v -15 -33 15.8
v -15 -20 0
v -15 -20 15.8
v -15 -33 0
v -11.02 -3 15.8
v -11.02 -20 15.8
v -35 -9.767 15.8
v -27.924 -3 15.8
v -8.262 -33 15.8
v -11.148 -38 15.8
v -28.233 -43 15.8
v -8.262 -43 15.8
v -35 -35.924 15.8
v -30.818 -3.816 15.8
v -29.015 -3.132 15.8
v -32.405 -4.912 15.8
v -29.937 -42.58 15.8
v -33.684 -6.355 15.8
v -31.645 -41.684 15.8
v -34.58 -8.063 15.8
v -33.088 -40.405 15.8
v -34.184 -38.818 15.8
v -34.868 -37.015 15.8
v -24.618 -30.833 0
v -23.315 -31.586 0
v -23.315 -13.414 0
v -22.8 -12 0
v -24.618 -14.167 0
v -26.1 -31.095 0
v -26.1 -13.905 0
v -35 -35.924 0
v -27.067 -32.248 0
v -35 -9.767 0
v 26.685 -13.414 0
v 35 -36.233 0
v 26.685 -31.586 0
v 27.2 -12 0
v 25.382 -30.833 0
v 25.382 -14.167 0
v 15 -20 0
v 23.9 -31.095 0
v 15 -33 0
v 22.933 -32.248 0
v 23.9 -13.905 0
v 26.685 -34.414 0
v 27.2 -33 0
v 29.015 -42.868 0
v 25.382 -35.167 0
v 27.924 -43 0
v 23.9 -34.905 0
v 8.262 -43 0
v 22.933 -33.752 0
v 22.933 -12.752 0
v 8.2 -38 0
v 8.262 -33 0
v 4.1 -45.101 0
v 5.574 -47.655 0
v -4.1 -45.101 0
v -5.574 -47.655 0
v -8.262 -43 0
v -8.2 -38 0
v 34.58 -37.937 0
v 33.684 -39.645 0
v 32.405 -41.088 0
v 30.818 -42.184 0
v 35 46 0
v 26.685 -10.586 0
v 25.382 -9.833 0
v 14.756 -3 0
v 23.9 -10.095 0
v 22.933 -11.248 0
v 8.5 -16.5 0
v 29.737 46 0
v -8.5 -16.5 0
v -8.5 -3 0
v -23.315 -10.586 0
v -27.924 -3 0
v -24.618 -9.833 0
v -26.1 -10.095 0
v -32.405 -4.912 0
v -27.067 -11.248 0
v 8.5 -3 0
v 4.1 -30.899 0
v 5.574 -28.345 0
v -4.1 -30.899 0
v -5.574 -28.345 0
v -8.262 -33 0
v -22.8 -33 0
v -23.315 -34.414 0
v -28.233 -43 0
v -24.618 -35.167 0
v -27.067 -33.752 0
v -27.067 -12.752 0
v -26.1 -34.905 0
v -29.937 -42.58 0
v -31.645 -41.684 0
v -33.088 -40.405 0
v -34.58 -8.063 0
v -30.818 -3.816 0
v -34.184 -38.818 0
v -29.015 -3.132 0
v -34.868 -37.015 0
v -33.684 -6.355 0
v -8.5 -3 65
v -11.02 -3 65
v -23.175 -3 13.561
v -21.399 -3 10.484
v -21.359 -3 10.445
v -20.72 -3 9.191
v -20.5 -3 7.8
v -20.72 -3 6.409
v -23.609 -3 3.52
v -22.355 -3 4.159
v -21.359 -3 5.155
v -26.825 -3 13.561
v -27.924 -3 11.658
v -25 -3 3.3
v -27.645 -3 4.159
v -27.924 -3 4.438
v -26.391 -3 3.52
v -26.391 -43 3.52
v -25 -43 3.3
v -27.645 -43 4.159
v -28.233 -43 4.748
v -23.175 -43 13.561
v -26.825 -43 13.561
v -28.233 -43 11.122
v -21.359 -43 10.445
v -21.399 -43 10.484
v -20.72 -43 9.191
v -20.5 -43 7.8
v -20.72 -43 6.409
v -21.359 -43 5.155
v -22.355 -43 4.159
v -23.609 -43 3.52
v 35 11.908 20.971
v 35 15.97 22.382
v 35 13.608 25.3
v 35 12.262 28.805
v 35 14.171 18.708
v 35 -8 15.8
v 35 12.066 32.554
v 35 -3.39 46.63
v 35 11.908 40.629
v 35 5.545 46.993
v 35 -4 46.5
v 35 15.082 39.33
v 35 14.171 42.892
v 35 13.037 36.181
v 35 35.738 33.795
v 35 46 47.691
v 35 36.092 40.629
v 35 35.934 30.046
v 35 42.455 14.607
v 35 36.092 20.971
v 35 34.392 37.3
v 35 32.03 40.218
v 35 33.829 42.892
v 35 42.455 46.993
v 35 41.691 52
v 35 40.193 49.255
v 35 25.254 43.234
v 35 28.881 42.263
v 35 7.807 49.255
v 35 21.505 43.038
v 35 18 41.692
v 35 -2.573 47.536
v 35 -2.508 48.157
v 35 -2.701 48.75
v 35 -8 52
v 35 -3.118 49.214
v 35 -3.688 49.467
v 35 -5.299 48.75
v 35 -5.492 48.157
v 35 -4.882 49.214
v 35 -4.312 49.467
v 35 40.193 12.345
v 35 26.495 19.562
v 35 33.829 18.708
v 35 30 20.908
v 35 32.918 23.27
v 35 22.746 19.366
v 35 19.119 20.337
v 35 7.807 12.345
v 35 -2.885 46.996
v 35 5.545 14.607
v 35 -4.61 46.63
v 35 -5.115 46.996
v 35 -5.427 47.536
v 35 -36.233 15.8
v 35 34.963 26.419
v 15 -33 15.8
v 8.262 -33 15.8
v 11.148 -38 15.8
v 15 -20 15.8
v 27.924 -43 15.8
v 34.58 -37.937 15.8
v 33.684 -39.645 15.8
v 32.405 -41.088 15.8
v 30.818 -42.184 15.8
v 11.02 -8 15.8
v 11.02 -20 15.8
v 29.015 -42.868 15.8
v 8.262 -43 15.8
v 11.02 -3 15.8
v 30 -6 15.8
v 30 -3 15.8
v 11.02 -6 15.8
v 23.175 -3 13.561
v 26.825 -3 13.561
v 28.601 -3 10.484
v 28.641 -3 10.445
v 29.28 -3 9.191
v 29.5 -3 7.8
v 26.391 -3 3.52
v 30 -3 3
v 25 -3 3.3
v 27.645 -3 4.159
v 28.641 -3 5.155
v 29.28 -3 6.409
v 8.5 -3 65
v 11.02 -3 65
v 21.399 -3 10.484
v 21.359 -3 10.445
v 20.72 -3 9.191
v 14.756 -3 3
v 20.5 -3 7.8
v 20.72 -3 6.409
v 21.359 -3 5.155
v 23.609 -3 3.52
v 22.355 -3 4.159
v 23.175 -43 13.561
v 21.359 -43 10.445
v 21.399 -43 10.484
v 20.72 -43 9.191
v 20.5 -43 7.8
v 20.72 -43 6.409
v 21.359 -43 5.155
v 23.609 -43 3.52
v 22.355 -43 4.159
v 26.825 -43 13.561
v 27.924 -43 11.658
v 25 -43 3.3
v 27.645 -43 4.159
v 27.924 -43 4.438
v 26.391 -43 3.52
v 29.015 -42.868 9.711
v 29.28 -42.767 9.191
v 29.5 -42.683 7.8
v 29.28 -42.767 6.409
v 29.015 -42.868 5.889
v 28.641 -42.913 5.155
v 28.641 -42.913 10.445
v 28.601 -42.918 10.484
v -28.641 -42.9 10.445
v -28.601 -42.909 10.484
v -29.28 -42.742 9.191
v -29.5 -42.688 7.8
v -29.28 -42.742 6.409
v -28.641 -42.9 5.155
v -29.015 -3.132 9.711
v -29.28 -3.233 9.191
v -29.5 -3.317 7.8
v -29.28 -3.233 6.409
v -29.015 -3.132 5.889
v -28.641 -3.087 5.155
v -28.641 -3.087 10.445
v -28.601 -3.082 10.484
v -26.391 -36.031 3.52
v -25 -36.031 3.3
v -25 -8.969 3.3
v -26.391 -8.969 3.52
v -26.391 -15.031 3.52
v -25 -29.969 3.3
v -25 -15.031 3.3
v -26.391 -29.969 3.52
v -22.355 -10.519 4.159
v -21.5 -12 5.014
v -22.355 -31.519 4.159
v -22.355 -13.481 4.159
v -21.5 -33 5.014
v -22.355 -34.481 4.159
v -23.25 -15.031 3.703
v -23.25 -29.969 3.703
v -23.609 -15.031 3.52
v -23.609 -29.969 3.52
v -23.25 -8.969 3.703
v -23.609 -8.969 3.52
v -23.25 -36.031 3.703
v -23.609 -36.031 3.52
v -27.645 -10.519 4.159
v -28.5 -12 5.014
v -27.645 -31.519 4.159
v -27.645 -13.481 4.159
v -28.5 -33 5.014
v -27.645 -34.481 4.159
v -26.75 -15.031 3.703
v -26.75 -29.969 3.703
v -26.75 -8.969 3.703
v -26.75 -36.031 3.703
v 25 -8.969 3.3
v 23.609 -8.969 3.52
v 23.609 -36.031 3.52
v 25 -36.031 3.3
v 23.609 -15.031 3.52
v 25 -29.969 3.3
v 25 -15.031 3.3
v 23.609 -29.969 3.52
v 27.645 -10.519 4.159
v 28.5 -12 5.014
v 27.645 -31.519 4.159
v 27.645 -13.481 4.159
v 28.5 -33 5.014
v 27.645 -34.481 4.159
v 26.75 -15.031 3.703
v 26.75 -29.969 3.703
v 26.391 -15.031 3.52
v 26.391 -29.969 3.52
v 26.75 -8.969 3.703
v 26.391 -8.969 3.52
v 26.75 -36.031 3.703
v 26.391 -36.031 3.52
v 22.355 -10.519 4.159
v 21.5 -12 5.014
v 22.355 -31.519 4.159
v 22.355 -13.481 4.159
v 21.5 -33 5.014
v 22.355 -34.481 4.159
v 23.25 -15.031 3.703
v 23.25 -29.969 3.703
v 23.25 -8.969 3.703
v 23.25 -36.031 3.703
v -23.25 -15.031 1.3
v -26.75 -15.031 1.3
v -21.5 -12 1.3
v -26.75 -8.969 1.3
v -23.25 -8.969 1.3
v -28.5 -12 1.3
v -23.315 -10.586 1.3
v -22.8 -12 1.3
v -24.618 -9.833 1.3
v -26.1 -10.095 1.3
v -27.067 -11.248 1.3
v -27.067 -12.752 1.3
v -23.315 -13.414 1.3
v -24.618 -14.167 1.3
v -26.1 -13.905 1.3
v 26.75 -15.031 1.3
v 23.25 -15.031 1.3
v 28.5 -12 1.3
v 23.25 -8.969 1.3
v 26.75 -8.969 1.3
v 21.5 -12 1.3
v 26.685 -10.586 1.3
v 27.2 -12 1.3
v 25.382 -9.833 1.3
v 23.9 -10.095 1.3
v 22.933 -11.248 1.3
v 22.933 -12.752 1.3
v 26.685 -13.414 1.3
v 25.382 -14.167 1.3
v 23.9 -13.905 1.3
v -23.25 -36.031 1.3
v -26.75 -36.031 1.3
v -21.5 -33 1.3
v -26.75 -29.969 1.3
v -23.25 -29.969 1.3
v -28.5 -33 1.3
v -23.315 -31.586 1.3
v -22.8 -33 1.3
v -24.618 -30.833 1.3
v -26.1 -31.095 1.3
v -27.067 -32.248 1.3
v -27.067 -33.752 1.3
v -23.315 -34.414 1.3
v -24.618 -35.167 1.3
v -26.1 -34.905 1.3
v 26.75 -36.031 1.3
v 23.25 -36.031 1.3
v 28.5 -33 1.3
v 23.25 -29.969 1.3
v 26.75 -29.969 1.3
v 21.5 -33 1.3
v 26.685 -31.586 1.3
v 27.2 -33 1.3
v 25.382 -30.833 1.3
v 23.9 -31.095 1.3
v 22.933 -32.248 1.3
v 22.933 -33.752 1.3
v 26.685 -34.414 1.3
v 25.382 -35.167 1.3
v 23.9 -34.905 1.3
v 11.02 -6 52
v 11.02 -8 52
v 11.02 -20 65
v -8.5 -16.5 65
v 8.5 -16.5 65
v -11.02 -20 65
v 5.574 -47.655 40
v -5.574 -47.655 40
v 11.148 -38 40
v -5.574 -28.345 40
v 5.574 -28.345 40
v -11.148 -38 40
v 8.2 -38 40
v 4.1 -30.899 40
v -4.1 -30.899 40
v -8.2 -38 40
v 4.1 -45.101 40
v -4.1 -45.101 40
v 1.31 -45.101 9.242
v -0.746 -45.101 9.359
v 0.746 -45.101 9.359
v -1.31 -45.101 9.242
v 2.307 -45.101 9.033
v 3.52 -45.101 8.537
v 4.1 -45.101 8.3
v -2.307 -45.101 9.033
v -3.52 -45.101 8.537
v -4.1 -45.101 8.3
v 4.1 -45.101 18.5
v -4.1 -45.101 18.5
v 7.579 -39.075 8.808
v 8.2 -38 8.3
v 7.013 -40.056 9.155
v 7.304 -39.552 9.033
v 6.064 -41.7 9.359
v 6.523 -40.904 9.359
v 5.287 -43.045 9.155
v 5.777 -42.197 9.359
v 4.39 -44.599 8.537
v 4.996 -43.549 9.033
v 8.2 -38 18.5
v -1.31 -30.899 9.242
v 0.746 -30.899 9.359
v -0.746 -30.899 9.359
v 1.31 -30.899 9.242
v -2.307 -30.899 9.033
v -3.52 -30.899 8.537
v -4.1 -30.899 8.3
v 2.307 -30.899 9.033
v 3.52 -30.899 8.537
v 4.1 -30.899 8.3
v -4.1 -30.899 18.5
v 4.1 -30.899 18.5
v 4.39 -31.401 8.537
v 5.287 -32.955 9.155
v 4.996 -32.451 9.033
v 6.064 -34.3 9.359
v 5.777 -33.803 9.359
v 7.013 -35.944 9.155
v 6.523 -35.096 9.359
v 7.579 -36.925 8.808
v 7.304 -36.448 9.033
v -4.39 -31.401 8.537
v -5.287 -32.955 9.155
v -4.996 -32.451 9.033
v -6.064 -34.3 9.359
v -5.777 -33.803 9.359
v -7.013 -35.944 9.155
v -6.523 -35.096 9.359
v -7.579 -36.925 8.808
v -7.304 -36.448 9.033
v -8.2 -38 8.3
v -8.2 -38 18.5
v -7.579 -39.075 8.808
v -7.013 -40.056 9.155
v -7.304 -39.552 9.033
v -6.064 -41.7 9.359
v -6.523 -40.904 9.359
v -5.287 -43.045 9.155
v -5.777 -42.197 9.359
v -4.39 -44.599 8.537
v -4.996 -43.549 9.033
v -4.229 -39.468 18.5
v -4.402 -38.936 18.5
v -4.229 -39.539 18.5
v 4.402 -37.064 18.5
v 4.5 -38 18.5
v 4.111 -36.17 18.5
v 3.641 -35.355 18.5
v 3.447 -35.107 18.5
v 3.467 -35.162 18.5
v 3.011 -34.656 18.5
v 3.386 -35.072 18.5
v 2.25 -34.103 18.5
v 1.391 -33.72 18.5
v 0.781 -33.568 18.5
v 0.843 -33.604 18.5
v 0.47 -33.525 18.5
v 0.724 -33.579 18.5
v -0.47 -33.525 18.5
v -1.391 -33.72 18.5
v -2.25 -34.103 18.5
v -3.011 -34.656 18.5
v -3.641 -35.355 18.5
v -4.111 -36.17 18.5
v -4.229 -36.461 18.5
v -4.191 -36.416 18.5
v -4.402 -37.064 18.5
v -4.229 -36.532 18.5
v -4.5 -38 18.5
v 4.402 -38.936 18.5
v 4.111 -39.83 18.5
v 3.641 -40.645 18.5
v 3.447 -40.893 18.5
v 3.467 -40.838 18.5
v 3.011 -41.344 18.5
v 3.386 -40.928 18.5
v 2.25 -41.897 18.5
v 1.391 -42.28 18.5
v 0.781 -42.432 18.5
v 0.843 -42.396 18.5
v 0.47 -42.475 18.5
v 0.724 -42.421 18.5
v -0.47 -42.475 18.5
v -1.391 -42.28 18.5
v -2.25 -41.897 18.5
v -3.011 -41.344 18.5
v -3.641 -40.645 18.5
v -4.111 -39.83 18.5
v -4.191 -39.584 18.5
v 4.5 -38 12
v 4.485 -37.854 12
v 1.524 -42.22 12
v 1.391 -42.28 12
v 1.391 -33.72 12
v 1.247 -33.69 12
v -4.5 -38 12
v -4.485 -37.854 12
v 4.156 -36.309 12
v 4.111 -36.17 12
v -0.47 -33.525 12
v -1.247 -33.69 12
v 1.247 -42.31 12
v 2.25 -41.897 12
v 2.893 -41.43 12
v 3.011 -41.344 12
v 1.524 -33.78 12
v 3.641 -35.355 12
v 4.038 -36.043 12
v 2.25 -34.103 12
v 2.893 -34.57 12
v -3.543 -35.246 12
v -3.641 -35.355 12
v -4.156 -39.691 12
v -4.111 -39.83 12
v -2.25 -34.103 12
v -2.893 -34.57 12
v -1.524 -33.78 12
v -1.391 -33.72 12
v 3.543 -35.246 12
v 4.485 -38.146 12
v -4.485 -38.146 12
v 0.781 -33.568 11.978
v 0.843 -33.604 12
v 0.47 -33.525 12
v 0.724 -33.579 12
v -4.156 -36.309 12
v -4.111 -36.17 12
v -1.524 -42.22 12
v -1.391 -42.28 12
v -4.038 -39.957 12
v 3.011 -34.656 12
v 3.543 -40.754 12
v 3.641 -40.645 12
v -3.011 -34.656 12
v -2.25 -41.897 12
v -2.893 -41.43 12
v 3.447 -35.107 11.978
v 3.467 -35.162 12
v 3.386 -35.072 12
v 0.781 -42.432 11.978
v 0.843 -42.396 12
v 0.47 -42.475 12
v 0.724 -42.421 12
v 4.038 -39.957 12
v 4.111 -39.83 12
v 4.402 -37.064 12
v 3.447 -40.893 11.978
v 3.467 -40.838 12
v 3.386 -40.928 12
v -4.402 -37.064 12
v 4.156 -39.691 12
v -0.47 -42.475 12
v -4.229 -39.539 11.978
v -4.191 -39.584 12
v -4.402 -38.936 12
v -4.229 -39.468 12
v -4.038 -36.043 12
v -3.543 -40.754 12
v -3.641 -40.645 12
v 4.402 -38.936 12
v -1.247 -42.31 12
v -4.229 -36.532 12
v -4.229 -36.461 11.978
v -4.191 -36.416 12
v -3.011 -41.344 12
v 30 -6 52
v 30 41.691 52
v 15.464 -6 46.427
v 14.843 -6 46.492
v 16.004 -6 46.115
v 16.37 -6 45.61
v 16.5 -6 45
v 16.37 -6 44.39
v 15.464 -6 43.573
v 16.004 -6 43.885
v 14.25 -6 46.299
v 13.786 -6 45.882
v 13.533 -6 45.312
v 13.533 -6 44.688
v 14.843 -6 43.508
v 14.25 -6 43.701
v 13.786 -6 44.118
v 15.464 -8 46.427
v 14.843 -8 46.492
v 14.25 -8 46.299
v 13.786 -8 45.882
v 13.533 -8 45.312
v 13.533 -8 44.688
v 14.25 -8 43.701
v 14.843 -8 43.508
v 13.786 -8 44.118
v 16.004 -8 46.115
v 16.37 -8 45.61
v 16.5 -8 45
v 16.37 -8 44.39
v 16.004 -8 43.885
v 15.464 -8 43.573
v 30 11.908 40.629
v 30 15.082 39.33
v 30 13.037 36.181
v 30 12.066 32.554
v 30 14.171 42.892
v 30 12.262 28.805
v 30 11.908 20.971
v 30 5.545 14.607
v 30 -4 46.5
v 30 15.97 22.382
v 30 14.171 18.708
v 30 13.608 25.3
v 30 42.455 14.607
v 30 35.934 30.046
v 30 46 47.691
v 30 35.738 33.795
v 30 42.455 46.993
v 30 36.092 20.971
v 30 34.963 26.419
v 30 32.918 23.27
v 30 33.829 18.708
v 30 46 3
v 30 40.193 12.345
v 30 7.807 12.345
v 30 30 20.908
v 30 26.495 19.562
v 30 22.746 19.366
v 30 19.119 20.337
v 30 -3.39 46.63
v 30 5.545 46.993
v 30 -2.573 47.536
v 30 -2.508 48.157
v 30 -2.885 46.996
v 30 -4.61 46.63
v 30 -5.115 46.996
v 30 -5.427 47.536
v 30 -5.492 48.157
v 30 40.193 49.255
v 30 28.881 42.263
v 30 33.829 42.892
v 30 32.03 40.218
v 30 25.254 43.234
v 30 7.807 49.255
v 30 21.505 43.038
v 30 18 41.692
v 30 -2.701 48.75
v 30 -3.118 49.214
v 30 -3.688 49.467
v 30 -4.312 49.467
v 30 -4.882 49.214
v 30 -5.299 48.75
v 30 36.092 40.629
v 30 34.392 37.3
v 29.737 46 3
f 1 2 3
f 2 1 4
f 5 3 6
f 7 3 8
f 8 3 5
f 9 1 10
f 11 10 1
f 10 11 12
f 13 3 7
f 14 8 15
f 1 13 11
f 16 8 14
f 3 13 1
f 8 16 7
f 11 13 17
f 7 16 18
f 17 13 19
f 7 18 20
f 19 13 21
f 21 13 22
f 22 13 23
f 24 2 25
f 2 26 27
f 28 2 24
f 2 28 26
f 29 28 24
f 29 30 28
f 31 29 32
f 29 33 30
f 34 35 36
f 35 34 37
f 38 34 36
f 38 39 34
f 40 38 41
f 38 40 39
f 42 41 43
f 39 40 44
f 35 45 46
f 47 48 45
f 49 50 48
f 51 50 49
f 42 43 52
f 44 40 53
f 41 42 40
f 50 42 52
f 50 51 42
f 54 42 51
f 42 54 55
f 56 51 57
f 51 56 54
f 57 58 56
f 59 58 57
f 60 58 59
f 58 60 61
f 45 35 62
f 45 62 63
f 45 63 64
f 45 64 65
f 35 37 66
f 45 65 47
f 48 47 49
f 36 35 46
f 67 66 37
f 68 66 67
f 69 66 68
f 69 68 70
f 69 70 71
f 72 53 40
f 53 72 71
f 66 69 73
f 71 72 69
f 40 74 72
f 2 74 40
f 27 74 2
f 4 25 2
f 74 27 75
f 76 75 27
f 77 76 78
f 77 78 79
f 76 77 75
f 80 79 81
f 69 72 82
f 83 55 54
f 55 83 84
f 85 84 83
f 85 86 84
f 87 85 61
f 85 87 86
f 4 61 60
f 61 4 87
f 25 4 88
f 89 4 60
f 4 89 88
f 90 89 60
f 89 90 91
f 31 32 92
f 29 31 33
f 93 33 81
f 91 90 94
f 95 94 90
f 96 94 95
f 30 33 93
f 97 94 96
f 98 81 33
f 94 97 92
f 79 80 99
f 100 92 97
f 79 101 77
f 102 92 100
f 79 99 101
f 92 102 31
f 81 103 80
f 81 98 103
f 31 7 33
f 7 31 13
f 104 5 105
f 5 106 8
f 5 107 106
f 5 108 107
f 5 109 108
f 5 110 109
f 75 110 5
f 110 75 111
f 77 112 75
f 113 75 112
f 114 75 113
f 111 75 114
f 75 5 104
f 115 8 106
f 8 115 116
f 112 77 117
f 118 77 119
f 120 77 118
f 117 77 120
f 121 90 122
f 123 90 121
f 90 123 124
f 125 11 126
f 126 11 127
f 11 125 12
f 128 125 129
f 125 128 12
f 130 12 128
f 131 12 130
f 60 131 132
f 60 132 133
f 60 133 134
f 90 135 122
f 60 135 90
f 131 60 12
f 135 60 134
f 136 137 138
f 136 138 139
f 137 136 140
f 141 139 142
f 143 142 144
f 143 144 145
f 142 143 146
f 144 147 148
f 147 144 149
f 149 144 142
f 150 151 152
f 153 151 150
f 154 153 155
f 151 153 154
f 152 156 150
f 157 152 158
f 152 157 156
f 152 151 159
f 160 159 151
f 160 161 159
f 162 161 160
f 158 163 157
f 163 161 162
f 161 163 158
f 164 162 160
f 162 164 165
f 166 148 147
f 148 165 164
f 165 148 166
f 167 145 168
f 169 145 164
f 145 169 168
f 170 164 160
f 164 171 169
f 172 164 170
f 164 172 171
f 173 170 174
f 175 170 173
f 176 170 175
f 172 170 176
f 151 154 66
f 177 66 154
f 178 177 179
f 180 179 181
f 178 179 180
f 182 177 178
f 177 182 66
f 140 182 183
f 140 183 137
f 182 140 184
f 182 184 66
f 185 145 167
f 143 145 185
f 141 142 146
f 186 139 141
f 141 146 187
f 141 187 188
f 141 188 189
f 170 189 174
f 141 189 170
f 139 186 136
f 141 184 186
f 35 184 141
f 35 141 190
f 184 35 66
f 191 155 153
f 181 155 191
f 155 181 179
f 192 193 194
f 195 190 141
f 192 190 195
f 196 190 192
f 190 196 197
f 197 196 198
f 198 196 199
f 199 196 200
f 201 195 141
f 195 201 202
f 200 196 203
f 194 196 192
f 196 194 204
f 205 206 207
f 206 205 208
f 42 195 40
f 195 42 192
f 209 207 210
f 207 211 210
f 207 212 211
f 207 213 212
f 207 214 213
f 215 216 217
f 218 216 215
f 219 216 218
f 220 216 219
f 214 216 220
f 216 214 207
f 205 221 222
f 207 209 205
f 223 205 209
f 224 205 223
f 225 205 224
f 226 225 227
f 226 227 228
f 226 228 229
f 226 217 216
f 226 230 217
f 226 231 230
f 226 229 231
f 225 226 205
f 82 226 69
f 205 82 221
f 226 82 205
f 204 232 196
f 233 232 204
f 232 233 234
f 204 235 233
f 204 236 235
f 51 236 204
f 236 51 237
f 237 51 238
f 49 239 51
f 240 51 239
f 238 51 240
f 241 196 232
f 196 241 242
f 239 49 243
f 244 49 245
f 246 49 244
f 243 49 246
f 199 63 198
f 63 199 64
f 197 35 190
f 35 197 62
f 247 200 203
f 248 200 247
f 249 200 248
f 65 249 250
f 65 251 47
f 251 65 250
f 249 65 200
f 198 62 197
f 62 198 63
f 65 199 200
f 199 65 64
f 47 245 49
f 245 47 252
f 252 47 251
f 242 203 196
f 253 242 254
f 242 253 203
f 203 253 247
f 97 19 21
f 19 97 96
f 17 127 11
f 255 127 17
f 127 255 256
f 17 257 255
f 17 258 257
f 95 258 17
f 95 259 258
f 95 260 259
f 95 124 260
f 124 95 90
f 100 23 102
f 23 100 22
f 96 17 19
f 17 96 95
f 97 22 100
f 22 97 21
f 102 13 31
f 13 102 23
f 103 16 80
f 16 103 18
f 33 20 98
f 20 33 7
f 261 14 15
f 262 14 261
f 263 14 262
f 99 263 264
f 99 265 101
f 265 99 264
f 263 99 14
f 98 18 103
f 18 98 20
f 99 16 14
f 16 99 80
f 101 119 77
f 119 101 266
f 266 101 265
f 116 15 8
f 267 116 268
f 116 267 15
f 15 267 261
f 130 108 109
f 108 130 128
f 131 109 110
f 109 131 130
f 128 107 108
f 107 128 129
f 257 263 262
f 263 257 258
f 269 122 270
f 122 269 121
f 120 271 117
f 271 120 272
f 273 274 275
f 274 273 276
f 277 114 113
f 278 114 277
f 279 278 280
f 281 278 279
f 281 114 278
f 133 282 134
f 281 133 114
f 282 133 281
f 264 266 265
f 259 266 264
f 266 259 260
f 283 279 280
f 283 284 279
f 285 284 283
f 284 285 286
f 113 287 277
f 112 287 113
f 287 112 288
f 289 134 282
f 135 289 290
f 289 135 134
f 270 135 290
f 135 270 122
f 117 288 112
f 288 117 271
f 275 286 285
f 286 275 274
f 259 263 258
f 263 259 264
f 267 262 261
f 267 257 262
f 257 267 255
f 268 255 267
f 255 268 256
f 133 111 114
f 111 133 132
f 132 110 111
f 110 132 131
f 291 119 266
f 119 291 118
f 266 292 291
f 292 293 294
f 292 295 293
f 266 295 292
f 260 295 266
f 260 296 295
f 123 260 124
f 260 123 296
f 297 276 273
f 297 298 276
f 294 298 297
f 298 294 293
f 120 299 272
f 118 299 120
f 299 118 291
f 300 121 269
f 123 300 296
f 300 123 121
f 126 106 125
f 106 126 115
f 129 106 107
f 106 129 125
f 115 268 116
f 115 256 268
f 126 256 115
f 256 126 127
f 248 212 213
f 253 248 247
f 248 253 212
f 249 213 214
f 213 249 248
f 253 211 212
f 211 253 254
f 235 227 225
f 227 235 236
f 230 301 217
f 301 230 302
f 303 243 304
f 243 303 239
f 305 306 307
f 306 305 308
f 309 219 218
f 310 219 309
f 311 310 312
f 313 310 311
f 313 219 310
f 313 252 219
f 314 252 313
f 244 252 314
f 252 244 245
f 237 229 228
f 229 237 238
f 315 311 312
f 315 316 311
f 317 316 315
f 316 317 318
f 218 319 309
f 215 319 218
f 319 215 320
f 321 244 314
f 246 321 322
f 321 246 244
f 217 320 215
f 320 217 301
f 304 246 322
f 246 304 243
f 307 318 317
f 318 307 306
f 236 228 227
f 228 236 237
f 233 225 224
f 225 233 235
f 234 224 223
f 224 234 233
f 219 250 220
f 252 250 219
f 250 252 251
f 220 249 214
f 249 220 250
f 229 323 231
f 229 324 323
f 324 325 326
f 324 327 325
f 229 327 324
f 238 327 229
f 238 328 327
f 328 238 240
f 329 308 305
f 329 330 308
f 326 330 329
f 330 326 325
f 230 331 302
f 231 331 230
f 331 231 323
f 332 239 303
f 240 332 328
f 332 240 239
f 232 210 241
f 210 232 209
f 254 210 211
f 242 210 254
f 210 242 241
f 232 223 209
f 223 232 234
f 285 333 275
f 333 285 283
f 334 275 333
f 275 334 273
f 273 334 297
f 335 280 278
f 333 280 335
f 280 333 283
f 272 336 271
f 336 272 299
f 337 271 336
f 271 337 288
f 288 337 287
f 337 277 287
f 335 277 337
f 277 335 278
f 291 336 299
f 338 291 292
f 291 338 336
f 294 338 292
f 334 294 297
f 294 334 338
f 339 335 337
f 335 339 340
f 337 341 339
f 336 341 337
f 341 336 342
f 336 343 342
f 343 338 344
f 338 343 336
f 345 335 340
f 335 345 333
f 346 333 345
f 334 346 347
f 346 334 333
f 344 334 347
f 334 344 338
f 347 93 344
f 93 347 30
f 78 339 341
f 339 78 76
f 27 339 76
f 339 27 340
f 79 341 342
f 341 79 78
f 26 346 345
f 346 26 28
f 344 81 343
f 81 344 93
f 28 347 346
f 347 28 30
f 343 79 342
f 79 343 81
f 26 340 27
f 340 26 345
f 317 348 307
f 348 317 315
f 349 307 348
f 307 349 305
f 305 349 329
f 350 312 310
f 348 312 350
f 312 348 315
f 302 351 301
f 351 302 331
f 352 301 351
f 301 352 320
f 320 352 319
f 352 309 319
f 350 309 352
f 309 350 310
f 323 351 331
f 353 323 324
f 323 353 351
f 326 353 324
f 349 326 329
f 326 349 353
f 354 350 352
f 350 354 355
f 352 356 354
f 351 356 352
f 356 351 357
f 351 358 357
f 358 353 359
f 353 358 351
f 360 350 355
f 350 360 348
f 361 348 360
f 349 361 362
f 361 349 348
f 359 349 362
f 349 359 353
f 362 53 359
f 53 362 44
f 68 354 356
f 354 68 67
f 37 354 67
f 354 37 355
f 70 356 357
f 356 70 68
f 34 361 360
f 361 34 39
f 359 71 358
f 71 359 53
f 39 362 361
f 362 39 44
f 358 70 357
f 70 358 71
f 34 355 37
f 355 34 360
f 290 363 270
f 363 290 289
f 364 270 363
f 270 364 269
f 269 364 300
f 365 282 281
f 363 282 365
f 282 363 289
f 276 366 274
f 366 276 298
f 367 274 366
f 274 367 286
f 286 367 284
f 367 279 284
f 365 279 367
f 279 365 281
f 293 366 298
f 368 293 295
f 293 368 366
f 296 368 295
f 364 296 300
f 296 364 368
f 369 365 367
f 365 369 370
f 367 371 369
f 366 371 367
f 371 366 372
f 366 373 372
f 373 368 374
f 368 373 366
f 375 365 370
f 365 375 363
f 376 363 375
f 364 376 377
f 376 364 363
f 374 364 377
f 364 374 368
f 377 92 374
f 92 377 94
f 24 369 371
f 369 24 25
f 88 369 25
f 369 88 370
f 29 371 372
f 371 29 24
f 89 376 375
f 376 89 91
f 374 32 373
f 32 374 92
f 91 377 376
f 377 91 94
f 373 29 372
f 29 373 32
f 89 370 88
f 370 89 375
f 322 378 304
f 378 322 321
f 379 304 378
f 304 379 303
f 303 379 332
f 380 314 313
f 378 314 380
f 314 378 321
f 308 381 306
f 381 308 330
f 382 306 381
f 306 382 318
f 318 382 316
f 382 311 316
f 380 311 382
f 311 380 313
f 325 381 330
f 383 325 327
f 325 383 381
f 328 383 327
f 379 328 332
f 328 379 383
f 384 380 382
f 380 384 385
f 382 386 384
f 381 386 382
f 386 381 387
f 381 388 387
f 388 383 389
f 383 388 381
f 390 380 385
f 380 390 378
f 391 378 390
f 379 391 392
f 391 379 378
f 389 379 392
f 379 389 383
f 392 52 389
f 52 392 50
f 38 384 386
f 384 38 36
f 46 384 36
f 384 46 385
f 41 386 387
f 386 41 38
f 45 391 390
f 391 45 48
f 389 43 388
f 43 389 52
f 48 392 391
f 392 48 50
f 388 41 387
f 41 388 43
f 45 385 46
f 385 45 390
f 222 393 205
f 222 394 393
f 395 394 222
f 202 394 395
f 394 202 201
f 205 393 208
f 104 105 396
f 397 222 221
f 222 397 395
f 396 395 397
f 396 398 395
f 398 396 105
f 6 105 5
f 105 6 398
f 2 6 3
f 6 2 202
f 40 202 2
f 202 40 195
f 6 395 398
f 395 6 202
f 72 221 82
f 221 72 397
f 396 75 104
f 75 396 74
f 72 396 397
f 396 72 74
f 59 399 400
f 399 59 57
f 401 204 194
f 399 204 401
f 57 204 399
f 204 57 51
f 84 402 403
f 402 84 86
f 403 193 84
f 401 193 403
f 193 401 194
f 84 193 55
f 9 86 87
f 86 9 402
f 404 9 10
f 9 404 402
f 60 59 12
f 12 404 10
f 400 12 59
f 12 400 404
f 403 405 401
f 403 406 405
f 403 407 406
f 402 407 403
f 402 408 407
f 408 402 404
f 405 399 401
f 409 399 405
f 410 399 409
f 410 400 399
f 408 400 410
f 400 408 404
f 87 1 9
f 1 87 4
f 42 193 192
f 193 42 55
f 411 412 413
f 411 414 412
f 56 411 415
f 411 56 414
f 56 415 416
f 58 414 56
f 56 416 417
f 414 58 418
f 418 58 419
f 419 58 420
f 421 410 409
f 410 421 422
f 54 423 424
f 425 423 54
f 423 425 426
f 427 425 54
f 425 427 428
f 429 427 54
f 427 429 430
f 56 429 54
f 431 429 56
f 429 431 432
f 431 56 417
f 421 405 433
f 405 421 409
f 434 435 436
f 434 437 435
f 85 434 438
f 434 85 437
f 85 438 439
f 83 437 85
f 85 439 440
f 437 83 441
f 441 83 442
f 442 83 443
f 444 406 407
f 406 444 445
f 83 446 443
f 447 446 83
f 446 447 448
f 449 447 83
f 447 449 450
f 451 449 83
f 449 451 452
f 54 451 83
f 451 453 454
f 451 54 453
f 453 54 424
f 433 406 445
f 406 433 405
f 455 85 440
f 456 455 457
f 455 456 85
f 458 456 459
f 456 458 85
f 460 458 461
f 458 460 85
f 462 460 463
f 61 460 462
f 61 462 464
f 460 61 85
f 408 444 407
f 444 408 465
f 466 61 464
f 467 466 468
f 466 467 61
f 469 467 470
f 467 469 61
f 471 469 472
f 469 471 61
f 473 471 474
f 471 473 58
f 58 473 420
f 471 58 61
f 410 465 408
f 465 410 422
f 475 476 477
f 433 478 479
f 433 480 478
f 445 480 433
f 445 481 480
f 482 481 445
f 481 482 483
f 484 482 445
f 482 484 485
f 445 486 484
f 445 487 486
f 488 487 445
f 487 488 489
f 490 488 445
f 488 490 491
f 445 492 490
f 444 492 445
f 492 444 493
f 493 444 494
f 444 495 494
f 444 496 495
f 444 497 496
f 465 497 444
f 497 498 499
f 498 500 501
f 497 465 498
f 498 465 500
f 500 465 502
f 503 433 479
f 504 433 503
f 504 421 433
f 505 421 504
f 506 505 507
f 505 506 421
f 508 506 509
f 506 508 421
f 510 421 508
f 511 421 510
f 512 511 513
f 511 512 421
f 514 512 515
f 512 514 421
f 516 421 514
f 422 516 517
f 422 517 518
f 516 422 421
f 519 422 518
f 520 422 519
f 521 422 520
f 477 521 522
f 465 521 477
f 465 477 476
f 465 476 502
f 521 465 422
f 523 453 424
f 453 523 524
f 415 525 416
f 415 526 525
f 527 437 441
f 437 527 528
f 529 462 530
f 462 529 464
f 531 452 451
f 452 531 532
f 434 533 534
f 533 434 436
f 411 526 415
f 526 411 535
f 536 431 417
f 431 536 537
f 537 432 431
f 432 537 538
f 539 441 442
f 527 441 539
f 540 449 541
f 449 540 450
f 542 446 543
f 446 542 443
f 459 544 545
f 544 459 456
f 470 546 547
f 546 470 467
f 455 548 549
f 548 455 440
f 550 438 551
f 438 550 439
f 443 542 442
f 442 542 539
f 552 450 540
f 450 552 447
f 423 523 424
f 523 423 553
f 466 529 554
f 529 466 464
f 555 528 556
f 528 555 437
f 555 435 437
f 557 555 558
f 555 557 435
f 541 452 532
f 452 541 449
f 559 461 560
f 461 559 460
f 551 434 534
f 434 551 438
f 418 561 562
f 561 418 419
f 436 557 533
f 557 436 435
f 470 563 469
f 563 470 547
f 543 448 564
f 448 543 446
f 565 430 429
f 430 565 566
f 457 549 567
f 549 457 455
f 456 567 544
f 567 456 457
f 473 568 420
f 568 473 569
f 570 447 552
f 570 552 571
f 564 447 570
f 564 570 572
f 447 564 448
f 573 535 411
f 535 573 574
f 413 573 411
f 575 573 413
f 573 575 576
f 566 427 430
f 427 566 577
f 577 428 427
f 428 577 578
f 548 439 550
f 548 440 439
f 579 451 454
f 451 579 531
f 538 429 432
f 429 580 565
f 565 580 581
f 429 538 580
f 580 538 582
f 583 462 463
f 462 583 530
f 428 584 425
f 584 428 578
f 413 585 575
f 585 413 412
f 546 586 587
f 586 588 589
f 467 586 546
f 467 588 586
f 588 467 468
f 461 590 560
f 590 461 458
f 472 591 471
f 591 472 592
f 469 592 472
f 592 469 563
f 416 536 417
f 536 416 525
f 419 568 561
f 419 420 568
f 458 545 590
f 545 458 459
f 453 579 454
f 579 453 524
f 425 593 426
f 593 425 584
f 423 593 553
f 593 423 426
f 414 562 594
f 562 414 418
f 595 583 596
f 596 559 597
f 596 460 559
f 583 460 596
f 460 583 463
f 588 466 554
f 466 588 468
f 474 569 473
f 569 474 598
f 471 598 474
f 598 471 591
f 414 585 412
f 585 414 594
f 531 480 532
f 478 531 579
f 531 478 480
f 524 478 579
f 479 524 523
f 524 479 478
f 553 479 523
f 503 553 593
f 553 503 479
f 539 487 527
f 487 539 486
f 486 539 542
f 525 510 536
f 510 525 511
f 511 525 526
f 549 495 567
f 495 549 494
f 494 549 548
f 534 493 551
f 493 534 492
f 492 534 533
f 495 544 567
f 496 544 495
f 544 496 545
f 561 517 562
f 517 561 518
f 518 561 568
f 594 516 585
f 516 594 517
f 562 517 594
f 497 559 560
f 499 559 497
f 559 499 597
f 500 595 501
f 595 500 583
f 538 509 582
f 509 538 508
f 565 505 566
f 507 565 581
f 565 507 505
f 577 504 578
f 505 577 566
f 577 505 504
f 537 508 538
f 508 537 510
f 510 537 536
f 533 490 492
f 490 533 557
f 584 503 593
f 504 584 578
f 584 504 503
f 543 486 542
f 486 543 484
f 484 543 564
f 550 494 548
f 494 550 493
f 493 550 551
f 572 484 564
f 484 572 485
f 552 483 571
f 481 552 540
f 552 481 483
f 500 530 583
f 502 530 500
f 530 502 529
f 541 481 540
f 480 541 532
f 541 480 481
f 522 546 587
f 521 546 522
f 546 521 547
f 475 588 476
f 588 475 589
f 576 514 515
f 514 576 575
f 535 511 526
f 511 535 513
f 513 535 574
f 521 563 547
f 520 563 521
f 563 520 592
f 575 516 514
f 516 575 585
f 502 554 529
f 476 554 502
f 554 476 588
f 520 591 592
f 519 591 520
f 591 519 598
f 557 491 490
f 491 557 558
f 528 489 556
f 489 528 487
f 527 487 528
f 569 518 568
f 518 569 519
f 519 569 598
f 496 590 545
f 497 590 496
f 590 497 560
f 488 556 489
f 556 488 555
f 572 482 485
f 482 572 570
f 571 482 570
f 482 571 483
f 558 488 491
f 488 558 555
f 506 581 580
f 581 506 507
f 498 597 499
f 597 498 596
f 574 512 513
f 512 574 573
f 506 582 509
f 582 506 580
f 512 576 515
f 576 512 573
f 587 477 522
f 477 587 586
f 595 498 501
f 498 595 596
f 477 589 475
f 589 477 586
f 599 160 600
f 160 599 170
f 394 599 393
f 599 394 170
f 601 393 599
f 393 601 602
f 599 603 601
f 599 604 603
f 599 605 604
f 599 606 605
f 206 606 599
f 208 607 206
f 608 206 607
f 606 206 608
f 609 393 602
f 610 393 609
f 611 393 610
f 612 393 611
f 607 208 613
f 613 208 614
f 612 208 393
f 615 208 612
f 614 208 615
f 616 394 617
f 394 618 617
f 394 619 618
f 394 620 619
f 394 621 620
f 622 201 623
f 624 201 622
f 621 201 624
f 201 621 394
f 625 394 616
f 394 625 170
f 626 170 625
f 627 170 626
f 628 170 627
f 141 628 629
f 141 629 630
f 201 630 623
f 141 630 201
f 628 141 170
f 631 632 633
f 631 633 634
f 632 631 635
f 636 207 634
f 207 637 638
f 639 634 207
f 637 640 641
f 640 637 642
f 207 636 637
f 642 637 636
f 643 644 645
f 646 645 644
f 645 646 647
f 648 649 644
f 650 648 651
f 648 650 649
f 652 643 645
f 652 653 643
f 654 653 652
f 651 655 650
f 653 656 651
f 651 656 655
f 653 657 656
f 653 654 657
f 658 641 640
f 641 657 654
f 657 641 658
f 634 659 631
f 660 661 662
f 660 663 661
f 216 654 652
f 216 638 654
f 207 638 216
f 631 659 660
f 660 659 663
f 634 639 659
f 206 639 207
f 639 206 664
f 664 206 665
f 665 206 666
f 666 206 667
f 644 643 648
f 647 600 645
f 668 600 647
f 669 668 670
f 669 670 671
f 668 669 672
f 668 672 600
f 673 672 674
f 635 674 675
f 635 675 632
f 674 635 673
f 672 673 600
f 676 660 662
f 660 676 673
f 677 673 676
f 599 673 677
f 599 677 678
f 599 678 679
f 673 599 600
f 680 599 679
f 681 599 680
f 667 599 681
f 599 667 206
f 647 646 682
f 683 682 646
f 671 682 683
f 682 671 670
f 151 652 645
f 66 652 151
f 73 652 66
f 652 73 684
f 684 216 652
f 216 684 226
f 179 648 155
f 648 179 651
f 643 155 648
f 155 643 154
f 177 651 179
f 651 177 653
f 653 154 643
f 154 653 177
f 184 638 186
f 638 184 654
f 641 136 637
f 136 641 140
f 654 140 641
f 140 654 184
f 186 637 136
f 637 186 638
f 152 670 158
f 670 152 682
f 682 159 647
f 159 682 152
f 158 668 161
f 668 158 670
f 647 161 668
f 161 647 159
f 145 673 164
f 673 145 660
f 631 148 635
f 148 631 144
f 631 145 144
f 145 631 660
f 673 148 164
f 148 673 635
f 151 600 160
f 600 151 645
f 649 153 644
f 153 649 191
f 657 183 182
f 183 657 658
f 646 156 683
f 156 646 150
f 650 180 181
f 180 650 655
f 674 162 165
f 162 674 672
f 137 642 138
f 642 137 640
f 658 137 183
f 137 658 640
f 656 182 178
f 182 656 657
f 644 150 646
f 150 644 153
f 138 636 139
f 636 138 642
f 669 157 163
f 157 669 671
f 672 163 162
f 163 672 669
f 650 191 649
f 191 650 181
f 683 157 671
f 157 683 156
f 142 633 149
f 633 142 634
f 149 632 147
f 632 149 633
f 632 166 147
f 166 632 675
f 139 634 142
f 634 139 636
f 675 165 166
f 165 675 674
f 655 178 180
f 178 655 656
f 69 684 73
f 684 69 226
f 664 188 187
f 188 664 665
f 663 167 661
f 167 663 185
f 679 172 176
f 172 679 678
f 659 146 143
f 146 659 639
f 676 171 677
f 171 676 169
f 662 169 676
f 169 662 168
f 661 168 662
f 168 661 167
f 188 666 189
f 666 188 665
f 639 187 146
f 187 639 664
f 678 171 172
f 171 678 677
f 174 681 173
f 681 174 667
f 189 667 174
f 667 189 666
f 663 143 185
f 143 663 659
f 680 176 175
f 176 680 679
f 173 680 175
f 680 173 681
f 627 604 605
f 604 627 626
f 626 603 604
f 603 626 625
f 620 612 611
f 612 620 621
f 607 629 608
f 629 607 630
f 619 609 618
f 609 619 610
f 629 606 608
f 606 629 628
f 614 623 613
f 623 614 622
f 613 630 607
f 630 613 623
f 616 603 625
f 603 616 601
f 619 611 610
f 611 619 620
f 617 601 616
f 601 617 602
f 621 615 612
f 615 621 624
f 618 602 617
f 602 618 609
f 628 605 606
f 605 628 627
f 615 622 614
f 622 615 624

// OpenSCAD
// file: ../configuration.scad
// PRUSA Mendel  
// Configuration file
// GNU GPL v2
// Josef Pra
// josefprusa@me.com
// prusadjs.cz
// http://www.reprap.org/wiki/Prusa_Mendel
// http://github.com/prusajr/PrusaMendel


// PLEASE SELECT ONE OF THE CONFIGURATIONS BELOW
// BY UN-COMMENTING IT


variant=0; //0 for metric
//variant=1; //1 for SAE
if(variant==0){
echo("variant: metric");
}else if(variant==1){
echo("variant: sae");
} else{
echo("WARNING: INVALID CONFIGURATION");
}




vars=[
//[m8_dia, m8_nut, m4_dia, m4_nut, m3_dia, m3_nut, bush_dia, mot_shaft, bush_rod, bush_outerdia, bush_length]
[9,16.4,5,9,4.4,7,11,5.3,8,16,11],//metric
[9,15.7,5.5,10.6,5.5,10.6,11.5,5.3,7.9375,16,11]//SAE
];


//BUSHING TYPE Can generate three versions
// 1 - regular old ones
// 2 - helical ones
// 3 - holders for brass or any other bought bushings
bushing_type = 2;


//Round corner diameter
round_corner_diameter = 8;


//Thin wall size
layer_height = 0.4;
perimeter_width_over_thicknes = 1.6;
infill_widht_over_thickness = 1.55;
thin_wall = 2*(perimeter_width_over_thicknes*layer_height+infill_widht_over_thickness*layer_height);
if(thin_wall<2){
	echo("Check thin wall size, its below 2mm!");
}
echo(thin_wall);


//DO NOT TOUCH THIS SECTION!
m8_diameter = vars[variant][0];
m8_nut_diameter = vars[variant][1];
m4_diameter = vars[variant][2];
m4_nut_diameter = vars[variant][3];
m3_diameter = vars[variant][4];
m3_nut_diameter = vars[variant][5];
bushing_diameter = vars[variant][6];
motor_shaft=vars[variant][7];
bushing_rodsize = vars[variant][8];
bushing_outerDiameter = vars[variant][9];
bushing_lenght = vars[variant][10];




// MINI-HUXLEY VERSION (TODO, just place holder)
// include <configuration-huxley.scad>


// MEGA VERSION (TODO, just place holder)
// include <configuration-mega.scad>




// Some basic functions, probably should be somewhere else
module roundcorner(diameter){
	difference(){
		cube(size = [diameter,diameter,99], center = false);
		translate(v = [diameter, diameter, 0]) cylinder(h = 100, r=diameter, center=true);
	}
}
// main file
// PRUSA Mendel  
// X-end with NEMA 17 motor mount
// GNU GPL v2
// Josef Průša
// josefprusa@me.com
// prusadjs.cz
// http://www.reprap.org/wiki/Prusa_Mendel
// http://github.com/prusajr/PrusaMendel

// Modified by Adrian to remove bridges and to add a conical cavity for the bottom nut.  This prints more reliably and cleanly.  I
// also added small holes to allow a loop of 3mm filament to be attached by a cable tie to make a flexible wire support.
// 26 May 2011


include <../configuration.scad>
corection = 1.17; 

/**
 *@name X end motor
 *@using 2 bushing
 *@using 8 m3x10
 *@using 4 m3xnut
 *@using 4 m3xwasher
 *@using 1 m8spring
 *@using 2 m8nut
 */


module xendmotor(){
difference()
{
translate(v = [0,17,24.5]) union(){
difference(){
union(){
//translate(v = [0, -25, 0]) cube(size = [70,70,5], center = true);
translate(v = [-25, -40, -16.6])cube(size = [20,40,15.8], center = true);
translate(v = [25, -40, -16.6])cube(size = [20,40,15.8], center = true);
}


//nut traps

translate(v = [-25, -29, -19.7]) cylinder(h = 7, r=m3_nut_diameter/2, $fn=6, center=true);
translate(v = [-25, -29, -20]) cylinder(h = 10, r=m3_diameter/2, $fn=9, center=true);
translate(v = [25, -29, -19.7]) cylinder(h = 7, r=m3_nut_diameter/2, $fn=6, center=true);
translate(v = [25, -29, -20]) cylinder(h = 10, r=m3_diameter/2, $fn=9, center=true);

translate(v = [-25, -50, -19.7]) cylinder(h = 7, r=m3_nut_diameter/2, $fn=6, center=true);
translate(v = [-25, -50, -20]) cylinder(h = 10, r=m3_diameter/2, $fn=9, center=true);
translate(v = [25, -50, -19.7]) cylinder(h = 7, r=m3_nut_diameter/2, $fn=6, center=true);
translate(v = [25, -50, -20]) cylinder(h = 10, r=m3_diameter/2, $fn=9, center=true);

//round corners
translate(v = [35.1, -60.1, -25]) rotate(a=[0,0,90]) roundcorner(round_corner_diameter);
translate(v = [-35.1, -60.1, -25]) rotate(a=[0,0,0]) roundcorner(round_corner_diameter);
translate(v = [-35.1, -19.9, -25]) rotate(a=[0,0,-90]) roundcorner(round_corner_diameter);

//holes for axis
translate(v = [-25, -18-22, -16.7]) rotate(a=[90,0,0]) {
	cylinder(h = 42, r=4.5, $fn=20, center=true);
	translate(v = [0, 2.60, 0]) cylinder(h = 42, r=3.65, $fn=6, center=true);
}
translate(v = [25, -18-22, -16.7]) rotate(a=[90,0,0]) {
	cylinder(h = 42, r=4.5, $fn=20, center=true);
	translate(v = [0, 2.60, 0]) cylinder(h = 42, r=3.65, $fn=6, center=true);
}
//slider cutouts
translate(v = [0, -25, 15]) 
	difference(){
	translate(v = [0, -0, -14.5])cube(size = [23,23,50], center = true);
	}
//nut trap
translate(v = [0, -55, 15]) {
	difference(){
	translate(v = [0, -0, -15])cylinder(h = 50, r=m8_nut_diameter/2+thin_wall, $fn=6, center=true);
	}
}
}

//slider
translate(v = [0, -25, 15]) 
	difference(){
union(){
	translate(v = [0, -3.5, -7]) cube(size = [17+2*thin_wall,17,65], center = true);

	translate(v = [0, -3.5, -31.6]) cube(size = [33,17,15.8], center = true);}
	translate(v = [0, -0, -7])cube(size = [17,17,70], center = true);}

//nut trap
translate(v = [0, -55, 15]) {
difference(){
	union(){difference(){
union(){
	translate(v = [0, -0, -19.5])cylinder(h = 40, r=m8_nut_diameter/2+thin_wall*corection, $fn=6, center=true);
	translate(v = [0, 0, -31.6]) cube(size = [35,10,15.8], center = true);}
	cylinder(h = 90, r=m8_nut_diameter/2, $fn=6, center=true);
	}
	
// Generate nut barrier with conical lead in under.  Replace this...

	//translate(v = [10, 0, -31]) cylinder(h = 4, r=m8_nut_diameter/2+thin_wall, $fn=6, center=true);

// ... with this--------
	difference()
	{
	translate(v = [0, 0, -29]) cylinder(h = 16, r=m8_nut_diameter/2+thin_wall, $fn=6, center=true);
	translate(v = [0, 0, -32]) cylinder(h = 10, r1=10+4, r2=4, $fn=30, center=true);
	cylinder(h = 100, r=4.5, $fn=30, center=true);
	}

//---------
	}
	translate(v = [0, 0, 12.5]) cylinder(h = 90, r=m8_diameter/2, $fn=9, center=true);
}
}


//nema17 connector
translate(v = [0, 0, -12]) difference(){
union(){
translate(v = [21, -24.0, 20.5]) cube(size = [24,2,38], center = true); // Changed to a web
translate(v = [32.5, 2, 13.5]) cube(size = [5,54,52], center = true);
translate(v = [22.5, 2, -11]) cube(size = [20,54,3], center = true);}

// some reduction of bottom part 
translate(v = [15, 15, -11]) rotate ([0,0,-17]) cube(size = [20,70,25], center = true);

translate(v = [0, 0, -4.7]){
	translate(v = [32.5, 7, 23.5]) rotate(a=[0,90,0]) rotate(a=[0,0,30]) cylinder(h = 10, r=12, $fn=20, center=true);

translate(v = [30, 7, 23]) rotate(a=[0,90,0]){rotate ([0,0,45]) translate([20,0,0]) cube(size = [9,3.2,25], center = true);
rotate ([0,0,-45]) translate([20,0,0]) cube(size = [9,3.2,25], center = true);
rotate ([0,0,135]) translate([20,0,0]) cube(size = [9,3.2,25], center = true);
rotate ([0,0,-135]) translate([20,0,0]) cube(size = [9,3.2,25], center = true);

rotate ([0,0,135]) translate([32,0,0]) cube(size = [9,20,25], center = true);


}
}
}}
// Cable support holes
translate([30, -4, 48]) rotate([0,90,0])cylinder(h = 20, r=1.5, $fn=15, center=true);
translate([15, -4, 45]) rotate([90,0,0])cylinder(h = 20, r=1.5, $fn=15, center=true);
}
}
xendmotor();
